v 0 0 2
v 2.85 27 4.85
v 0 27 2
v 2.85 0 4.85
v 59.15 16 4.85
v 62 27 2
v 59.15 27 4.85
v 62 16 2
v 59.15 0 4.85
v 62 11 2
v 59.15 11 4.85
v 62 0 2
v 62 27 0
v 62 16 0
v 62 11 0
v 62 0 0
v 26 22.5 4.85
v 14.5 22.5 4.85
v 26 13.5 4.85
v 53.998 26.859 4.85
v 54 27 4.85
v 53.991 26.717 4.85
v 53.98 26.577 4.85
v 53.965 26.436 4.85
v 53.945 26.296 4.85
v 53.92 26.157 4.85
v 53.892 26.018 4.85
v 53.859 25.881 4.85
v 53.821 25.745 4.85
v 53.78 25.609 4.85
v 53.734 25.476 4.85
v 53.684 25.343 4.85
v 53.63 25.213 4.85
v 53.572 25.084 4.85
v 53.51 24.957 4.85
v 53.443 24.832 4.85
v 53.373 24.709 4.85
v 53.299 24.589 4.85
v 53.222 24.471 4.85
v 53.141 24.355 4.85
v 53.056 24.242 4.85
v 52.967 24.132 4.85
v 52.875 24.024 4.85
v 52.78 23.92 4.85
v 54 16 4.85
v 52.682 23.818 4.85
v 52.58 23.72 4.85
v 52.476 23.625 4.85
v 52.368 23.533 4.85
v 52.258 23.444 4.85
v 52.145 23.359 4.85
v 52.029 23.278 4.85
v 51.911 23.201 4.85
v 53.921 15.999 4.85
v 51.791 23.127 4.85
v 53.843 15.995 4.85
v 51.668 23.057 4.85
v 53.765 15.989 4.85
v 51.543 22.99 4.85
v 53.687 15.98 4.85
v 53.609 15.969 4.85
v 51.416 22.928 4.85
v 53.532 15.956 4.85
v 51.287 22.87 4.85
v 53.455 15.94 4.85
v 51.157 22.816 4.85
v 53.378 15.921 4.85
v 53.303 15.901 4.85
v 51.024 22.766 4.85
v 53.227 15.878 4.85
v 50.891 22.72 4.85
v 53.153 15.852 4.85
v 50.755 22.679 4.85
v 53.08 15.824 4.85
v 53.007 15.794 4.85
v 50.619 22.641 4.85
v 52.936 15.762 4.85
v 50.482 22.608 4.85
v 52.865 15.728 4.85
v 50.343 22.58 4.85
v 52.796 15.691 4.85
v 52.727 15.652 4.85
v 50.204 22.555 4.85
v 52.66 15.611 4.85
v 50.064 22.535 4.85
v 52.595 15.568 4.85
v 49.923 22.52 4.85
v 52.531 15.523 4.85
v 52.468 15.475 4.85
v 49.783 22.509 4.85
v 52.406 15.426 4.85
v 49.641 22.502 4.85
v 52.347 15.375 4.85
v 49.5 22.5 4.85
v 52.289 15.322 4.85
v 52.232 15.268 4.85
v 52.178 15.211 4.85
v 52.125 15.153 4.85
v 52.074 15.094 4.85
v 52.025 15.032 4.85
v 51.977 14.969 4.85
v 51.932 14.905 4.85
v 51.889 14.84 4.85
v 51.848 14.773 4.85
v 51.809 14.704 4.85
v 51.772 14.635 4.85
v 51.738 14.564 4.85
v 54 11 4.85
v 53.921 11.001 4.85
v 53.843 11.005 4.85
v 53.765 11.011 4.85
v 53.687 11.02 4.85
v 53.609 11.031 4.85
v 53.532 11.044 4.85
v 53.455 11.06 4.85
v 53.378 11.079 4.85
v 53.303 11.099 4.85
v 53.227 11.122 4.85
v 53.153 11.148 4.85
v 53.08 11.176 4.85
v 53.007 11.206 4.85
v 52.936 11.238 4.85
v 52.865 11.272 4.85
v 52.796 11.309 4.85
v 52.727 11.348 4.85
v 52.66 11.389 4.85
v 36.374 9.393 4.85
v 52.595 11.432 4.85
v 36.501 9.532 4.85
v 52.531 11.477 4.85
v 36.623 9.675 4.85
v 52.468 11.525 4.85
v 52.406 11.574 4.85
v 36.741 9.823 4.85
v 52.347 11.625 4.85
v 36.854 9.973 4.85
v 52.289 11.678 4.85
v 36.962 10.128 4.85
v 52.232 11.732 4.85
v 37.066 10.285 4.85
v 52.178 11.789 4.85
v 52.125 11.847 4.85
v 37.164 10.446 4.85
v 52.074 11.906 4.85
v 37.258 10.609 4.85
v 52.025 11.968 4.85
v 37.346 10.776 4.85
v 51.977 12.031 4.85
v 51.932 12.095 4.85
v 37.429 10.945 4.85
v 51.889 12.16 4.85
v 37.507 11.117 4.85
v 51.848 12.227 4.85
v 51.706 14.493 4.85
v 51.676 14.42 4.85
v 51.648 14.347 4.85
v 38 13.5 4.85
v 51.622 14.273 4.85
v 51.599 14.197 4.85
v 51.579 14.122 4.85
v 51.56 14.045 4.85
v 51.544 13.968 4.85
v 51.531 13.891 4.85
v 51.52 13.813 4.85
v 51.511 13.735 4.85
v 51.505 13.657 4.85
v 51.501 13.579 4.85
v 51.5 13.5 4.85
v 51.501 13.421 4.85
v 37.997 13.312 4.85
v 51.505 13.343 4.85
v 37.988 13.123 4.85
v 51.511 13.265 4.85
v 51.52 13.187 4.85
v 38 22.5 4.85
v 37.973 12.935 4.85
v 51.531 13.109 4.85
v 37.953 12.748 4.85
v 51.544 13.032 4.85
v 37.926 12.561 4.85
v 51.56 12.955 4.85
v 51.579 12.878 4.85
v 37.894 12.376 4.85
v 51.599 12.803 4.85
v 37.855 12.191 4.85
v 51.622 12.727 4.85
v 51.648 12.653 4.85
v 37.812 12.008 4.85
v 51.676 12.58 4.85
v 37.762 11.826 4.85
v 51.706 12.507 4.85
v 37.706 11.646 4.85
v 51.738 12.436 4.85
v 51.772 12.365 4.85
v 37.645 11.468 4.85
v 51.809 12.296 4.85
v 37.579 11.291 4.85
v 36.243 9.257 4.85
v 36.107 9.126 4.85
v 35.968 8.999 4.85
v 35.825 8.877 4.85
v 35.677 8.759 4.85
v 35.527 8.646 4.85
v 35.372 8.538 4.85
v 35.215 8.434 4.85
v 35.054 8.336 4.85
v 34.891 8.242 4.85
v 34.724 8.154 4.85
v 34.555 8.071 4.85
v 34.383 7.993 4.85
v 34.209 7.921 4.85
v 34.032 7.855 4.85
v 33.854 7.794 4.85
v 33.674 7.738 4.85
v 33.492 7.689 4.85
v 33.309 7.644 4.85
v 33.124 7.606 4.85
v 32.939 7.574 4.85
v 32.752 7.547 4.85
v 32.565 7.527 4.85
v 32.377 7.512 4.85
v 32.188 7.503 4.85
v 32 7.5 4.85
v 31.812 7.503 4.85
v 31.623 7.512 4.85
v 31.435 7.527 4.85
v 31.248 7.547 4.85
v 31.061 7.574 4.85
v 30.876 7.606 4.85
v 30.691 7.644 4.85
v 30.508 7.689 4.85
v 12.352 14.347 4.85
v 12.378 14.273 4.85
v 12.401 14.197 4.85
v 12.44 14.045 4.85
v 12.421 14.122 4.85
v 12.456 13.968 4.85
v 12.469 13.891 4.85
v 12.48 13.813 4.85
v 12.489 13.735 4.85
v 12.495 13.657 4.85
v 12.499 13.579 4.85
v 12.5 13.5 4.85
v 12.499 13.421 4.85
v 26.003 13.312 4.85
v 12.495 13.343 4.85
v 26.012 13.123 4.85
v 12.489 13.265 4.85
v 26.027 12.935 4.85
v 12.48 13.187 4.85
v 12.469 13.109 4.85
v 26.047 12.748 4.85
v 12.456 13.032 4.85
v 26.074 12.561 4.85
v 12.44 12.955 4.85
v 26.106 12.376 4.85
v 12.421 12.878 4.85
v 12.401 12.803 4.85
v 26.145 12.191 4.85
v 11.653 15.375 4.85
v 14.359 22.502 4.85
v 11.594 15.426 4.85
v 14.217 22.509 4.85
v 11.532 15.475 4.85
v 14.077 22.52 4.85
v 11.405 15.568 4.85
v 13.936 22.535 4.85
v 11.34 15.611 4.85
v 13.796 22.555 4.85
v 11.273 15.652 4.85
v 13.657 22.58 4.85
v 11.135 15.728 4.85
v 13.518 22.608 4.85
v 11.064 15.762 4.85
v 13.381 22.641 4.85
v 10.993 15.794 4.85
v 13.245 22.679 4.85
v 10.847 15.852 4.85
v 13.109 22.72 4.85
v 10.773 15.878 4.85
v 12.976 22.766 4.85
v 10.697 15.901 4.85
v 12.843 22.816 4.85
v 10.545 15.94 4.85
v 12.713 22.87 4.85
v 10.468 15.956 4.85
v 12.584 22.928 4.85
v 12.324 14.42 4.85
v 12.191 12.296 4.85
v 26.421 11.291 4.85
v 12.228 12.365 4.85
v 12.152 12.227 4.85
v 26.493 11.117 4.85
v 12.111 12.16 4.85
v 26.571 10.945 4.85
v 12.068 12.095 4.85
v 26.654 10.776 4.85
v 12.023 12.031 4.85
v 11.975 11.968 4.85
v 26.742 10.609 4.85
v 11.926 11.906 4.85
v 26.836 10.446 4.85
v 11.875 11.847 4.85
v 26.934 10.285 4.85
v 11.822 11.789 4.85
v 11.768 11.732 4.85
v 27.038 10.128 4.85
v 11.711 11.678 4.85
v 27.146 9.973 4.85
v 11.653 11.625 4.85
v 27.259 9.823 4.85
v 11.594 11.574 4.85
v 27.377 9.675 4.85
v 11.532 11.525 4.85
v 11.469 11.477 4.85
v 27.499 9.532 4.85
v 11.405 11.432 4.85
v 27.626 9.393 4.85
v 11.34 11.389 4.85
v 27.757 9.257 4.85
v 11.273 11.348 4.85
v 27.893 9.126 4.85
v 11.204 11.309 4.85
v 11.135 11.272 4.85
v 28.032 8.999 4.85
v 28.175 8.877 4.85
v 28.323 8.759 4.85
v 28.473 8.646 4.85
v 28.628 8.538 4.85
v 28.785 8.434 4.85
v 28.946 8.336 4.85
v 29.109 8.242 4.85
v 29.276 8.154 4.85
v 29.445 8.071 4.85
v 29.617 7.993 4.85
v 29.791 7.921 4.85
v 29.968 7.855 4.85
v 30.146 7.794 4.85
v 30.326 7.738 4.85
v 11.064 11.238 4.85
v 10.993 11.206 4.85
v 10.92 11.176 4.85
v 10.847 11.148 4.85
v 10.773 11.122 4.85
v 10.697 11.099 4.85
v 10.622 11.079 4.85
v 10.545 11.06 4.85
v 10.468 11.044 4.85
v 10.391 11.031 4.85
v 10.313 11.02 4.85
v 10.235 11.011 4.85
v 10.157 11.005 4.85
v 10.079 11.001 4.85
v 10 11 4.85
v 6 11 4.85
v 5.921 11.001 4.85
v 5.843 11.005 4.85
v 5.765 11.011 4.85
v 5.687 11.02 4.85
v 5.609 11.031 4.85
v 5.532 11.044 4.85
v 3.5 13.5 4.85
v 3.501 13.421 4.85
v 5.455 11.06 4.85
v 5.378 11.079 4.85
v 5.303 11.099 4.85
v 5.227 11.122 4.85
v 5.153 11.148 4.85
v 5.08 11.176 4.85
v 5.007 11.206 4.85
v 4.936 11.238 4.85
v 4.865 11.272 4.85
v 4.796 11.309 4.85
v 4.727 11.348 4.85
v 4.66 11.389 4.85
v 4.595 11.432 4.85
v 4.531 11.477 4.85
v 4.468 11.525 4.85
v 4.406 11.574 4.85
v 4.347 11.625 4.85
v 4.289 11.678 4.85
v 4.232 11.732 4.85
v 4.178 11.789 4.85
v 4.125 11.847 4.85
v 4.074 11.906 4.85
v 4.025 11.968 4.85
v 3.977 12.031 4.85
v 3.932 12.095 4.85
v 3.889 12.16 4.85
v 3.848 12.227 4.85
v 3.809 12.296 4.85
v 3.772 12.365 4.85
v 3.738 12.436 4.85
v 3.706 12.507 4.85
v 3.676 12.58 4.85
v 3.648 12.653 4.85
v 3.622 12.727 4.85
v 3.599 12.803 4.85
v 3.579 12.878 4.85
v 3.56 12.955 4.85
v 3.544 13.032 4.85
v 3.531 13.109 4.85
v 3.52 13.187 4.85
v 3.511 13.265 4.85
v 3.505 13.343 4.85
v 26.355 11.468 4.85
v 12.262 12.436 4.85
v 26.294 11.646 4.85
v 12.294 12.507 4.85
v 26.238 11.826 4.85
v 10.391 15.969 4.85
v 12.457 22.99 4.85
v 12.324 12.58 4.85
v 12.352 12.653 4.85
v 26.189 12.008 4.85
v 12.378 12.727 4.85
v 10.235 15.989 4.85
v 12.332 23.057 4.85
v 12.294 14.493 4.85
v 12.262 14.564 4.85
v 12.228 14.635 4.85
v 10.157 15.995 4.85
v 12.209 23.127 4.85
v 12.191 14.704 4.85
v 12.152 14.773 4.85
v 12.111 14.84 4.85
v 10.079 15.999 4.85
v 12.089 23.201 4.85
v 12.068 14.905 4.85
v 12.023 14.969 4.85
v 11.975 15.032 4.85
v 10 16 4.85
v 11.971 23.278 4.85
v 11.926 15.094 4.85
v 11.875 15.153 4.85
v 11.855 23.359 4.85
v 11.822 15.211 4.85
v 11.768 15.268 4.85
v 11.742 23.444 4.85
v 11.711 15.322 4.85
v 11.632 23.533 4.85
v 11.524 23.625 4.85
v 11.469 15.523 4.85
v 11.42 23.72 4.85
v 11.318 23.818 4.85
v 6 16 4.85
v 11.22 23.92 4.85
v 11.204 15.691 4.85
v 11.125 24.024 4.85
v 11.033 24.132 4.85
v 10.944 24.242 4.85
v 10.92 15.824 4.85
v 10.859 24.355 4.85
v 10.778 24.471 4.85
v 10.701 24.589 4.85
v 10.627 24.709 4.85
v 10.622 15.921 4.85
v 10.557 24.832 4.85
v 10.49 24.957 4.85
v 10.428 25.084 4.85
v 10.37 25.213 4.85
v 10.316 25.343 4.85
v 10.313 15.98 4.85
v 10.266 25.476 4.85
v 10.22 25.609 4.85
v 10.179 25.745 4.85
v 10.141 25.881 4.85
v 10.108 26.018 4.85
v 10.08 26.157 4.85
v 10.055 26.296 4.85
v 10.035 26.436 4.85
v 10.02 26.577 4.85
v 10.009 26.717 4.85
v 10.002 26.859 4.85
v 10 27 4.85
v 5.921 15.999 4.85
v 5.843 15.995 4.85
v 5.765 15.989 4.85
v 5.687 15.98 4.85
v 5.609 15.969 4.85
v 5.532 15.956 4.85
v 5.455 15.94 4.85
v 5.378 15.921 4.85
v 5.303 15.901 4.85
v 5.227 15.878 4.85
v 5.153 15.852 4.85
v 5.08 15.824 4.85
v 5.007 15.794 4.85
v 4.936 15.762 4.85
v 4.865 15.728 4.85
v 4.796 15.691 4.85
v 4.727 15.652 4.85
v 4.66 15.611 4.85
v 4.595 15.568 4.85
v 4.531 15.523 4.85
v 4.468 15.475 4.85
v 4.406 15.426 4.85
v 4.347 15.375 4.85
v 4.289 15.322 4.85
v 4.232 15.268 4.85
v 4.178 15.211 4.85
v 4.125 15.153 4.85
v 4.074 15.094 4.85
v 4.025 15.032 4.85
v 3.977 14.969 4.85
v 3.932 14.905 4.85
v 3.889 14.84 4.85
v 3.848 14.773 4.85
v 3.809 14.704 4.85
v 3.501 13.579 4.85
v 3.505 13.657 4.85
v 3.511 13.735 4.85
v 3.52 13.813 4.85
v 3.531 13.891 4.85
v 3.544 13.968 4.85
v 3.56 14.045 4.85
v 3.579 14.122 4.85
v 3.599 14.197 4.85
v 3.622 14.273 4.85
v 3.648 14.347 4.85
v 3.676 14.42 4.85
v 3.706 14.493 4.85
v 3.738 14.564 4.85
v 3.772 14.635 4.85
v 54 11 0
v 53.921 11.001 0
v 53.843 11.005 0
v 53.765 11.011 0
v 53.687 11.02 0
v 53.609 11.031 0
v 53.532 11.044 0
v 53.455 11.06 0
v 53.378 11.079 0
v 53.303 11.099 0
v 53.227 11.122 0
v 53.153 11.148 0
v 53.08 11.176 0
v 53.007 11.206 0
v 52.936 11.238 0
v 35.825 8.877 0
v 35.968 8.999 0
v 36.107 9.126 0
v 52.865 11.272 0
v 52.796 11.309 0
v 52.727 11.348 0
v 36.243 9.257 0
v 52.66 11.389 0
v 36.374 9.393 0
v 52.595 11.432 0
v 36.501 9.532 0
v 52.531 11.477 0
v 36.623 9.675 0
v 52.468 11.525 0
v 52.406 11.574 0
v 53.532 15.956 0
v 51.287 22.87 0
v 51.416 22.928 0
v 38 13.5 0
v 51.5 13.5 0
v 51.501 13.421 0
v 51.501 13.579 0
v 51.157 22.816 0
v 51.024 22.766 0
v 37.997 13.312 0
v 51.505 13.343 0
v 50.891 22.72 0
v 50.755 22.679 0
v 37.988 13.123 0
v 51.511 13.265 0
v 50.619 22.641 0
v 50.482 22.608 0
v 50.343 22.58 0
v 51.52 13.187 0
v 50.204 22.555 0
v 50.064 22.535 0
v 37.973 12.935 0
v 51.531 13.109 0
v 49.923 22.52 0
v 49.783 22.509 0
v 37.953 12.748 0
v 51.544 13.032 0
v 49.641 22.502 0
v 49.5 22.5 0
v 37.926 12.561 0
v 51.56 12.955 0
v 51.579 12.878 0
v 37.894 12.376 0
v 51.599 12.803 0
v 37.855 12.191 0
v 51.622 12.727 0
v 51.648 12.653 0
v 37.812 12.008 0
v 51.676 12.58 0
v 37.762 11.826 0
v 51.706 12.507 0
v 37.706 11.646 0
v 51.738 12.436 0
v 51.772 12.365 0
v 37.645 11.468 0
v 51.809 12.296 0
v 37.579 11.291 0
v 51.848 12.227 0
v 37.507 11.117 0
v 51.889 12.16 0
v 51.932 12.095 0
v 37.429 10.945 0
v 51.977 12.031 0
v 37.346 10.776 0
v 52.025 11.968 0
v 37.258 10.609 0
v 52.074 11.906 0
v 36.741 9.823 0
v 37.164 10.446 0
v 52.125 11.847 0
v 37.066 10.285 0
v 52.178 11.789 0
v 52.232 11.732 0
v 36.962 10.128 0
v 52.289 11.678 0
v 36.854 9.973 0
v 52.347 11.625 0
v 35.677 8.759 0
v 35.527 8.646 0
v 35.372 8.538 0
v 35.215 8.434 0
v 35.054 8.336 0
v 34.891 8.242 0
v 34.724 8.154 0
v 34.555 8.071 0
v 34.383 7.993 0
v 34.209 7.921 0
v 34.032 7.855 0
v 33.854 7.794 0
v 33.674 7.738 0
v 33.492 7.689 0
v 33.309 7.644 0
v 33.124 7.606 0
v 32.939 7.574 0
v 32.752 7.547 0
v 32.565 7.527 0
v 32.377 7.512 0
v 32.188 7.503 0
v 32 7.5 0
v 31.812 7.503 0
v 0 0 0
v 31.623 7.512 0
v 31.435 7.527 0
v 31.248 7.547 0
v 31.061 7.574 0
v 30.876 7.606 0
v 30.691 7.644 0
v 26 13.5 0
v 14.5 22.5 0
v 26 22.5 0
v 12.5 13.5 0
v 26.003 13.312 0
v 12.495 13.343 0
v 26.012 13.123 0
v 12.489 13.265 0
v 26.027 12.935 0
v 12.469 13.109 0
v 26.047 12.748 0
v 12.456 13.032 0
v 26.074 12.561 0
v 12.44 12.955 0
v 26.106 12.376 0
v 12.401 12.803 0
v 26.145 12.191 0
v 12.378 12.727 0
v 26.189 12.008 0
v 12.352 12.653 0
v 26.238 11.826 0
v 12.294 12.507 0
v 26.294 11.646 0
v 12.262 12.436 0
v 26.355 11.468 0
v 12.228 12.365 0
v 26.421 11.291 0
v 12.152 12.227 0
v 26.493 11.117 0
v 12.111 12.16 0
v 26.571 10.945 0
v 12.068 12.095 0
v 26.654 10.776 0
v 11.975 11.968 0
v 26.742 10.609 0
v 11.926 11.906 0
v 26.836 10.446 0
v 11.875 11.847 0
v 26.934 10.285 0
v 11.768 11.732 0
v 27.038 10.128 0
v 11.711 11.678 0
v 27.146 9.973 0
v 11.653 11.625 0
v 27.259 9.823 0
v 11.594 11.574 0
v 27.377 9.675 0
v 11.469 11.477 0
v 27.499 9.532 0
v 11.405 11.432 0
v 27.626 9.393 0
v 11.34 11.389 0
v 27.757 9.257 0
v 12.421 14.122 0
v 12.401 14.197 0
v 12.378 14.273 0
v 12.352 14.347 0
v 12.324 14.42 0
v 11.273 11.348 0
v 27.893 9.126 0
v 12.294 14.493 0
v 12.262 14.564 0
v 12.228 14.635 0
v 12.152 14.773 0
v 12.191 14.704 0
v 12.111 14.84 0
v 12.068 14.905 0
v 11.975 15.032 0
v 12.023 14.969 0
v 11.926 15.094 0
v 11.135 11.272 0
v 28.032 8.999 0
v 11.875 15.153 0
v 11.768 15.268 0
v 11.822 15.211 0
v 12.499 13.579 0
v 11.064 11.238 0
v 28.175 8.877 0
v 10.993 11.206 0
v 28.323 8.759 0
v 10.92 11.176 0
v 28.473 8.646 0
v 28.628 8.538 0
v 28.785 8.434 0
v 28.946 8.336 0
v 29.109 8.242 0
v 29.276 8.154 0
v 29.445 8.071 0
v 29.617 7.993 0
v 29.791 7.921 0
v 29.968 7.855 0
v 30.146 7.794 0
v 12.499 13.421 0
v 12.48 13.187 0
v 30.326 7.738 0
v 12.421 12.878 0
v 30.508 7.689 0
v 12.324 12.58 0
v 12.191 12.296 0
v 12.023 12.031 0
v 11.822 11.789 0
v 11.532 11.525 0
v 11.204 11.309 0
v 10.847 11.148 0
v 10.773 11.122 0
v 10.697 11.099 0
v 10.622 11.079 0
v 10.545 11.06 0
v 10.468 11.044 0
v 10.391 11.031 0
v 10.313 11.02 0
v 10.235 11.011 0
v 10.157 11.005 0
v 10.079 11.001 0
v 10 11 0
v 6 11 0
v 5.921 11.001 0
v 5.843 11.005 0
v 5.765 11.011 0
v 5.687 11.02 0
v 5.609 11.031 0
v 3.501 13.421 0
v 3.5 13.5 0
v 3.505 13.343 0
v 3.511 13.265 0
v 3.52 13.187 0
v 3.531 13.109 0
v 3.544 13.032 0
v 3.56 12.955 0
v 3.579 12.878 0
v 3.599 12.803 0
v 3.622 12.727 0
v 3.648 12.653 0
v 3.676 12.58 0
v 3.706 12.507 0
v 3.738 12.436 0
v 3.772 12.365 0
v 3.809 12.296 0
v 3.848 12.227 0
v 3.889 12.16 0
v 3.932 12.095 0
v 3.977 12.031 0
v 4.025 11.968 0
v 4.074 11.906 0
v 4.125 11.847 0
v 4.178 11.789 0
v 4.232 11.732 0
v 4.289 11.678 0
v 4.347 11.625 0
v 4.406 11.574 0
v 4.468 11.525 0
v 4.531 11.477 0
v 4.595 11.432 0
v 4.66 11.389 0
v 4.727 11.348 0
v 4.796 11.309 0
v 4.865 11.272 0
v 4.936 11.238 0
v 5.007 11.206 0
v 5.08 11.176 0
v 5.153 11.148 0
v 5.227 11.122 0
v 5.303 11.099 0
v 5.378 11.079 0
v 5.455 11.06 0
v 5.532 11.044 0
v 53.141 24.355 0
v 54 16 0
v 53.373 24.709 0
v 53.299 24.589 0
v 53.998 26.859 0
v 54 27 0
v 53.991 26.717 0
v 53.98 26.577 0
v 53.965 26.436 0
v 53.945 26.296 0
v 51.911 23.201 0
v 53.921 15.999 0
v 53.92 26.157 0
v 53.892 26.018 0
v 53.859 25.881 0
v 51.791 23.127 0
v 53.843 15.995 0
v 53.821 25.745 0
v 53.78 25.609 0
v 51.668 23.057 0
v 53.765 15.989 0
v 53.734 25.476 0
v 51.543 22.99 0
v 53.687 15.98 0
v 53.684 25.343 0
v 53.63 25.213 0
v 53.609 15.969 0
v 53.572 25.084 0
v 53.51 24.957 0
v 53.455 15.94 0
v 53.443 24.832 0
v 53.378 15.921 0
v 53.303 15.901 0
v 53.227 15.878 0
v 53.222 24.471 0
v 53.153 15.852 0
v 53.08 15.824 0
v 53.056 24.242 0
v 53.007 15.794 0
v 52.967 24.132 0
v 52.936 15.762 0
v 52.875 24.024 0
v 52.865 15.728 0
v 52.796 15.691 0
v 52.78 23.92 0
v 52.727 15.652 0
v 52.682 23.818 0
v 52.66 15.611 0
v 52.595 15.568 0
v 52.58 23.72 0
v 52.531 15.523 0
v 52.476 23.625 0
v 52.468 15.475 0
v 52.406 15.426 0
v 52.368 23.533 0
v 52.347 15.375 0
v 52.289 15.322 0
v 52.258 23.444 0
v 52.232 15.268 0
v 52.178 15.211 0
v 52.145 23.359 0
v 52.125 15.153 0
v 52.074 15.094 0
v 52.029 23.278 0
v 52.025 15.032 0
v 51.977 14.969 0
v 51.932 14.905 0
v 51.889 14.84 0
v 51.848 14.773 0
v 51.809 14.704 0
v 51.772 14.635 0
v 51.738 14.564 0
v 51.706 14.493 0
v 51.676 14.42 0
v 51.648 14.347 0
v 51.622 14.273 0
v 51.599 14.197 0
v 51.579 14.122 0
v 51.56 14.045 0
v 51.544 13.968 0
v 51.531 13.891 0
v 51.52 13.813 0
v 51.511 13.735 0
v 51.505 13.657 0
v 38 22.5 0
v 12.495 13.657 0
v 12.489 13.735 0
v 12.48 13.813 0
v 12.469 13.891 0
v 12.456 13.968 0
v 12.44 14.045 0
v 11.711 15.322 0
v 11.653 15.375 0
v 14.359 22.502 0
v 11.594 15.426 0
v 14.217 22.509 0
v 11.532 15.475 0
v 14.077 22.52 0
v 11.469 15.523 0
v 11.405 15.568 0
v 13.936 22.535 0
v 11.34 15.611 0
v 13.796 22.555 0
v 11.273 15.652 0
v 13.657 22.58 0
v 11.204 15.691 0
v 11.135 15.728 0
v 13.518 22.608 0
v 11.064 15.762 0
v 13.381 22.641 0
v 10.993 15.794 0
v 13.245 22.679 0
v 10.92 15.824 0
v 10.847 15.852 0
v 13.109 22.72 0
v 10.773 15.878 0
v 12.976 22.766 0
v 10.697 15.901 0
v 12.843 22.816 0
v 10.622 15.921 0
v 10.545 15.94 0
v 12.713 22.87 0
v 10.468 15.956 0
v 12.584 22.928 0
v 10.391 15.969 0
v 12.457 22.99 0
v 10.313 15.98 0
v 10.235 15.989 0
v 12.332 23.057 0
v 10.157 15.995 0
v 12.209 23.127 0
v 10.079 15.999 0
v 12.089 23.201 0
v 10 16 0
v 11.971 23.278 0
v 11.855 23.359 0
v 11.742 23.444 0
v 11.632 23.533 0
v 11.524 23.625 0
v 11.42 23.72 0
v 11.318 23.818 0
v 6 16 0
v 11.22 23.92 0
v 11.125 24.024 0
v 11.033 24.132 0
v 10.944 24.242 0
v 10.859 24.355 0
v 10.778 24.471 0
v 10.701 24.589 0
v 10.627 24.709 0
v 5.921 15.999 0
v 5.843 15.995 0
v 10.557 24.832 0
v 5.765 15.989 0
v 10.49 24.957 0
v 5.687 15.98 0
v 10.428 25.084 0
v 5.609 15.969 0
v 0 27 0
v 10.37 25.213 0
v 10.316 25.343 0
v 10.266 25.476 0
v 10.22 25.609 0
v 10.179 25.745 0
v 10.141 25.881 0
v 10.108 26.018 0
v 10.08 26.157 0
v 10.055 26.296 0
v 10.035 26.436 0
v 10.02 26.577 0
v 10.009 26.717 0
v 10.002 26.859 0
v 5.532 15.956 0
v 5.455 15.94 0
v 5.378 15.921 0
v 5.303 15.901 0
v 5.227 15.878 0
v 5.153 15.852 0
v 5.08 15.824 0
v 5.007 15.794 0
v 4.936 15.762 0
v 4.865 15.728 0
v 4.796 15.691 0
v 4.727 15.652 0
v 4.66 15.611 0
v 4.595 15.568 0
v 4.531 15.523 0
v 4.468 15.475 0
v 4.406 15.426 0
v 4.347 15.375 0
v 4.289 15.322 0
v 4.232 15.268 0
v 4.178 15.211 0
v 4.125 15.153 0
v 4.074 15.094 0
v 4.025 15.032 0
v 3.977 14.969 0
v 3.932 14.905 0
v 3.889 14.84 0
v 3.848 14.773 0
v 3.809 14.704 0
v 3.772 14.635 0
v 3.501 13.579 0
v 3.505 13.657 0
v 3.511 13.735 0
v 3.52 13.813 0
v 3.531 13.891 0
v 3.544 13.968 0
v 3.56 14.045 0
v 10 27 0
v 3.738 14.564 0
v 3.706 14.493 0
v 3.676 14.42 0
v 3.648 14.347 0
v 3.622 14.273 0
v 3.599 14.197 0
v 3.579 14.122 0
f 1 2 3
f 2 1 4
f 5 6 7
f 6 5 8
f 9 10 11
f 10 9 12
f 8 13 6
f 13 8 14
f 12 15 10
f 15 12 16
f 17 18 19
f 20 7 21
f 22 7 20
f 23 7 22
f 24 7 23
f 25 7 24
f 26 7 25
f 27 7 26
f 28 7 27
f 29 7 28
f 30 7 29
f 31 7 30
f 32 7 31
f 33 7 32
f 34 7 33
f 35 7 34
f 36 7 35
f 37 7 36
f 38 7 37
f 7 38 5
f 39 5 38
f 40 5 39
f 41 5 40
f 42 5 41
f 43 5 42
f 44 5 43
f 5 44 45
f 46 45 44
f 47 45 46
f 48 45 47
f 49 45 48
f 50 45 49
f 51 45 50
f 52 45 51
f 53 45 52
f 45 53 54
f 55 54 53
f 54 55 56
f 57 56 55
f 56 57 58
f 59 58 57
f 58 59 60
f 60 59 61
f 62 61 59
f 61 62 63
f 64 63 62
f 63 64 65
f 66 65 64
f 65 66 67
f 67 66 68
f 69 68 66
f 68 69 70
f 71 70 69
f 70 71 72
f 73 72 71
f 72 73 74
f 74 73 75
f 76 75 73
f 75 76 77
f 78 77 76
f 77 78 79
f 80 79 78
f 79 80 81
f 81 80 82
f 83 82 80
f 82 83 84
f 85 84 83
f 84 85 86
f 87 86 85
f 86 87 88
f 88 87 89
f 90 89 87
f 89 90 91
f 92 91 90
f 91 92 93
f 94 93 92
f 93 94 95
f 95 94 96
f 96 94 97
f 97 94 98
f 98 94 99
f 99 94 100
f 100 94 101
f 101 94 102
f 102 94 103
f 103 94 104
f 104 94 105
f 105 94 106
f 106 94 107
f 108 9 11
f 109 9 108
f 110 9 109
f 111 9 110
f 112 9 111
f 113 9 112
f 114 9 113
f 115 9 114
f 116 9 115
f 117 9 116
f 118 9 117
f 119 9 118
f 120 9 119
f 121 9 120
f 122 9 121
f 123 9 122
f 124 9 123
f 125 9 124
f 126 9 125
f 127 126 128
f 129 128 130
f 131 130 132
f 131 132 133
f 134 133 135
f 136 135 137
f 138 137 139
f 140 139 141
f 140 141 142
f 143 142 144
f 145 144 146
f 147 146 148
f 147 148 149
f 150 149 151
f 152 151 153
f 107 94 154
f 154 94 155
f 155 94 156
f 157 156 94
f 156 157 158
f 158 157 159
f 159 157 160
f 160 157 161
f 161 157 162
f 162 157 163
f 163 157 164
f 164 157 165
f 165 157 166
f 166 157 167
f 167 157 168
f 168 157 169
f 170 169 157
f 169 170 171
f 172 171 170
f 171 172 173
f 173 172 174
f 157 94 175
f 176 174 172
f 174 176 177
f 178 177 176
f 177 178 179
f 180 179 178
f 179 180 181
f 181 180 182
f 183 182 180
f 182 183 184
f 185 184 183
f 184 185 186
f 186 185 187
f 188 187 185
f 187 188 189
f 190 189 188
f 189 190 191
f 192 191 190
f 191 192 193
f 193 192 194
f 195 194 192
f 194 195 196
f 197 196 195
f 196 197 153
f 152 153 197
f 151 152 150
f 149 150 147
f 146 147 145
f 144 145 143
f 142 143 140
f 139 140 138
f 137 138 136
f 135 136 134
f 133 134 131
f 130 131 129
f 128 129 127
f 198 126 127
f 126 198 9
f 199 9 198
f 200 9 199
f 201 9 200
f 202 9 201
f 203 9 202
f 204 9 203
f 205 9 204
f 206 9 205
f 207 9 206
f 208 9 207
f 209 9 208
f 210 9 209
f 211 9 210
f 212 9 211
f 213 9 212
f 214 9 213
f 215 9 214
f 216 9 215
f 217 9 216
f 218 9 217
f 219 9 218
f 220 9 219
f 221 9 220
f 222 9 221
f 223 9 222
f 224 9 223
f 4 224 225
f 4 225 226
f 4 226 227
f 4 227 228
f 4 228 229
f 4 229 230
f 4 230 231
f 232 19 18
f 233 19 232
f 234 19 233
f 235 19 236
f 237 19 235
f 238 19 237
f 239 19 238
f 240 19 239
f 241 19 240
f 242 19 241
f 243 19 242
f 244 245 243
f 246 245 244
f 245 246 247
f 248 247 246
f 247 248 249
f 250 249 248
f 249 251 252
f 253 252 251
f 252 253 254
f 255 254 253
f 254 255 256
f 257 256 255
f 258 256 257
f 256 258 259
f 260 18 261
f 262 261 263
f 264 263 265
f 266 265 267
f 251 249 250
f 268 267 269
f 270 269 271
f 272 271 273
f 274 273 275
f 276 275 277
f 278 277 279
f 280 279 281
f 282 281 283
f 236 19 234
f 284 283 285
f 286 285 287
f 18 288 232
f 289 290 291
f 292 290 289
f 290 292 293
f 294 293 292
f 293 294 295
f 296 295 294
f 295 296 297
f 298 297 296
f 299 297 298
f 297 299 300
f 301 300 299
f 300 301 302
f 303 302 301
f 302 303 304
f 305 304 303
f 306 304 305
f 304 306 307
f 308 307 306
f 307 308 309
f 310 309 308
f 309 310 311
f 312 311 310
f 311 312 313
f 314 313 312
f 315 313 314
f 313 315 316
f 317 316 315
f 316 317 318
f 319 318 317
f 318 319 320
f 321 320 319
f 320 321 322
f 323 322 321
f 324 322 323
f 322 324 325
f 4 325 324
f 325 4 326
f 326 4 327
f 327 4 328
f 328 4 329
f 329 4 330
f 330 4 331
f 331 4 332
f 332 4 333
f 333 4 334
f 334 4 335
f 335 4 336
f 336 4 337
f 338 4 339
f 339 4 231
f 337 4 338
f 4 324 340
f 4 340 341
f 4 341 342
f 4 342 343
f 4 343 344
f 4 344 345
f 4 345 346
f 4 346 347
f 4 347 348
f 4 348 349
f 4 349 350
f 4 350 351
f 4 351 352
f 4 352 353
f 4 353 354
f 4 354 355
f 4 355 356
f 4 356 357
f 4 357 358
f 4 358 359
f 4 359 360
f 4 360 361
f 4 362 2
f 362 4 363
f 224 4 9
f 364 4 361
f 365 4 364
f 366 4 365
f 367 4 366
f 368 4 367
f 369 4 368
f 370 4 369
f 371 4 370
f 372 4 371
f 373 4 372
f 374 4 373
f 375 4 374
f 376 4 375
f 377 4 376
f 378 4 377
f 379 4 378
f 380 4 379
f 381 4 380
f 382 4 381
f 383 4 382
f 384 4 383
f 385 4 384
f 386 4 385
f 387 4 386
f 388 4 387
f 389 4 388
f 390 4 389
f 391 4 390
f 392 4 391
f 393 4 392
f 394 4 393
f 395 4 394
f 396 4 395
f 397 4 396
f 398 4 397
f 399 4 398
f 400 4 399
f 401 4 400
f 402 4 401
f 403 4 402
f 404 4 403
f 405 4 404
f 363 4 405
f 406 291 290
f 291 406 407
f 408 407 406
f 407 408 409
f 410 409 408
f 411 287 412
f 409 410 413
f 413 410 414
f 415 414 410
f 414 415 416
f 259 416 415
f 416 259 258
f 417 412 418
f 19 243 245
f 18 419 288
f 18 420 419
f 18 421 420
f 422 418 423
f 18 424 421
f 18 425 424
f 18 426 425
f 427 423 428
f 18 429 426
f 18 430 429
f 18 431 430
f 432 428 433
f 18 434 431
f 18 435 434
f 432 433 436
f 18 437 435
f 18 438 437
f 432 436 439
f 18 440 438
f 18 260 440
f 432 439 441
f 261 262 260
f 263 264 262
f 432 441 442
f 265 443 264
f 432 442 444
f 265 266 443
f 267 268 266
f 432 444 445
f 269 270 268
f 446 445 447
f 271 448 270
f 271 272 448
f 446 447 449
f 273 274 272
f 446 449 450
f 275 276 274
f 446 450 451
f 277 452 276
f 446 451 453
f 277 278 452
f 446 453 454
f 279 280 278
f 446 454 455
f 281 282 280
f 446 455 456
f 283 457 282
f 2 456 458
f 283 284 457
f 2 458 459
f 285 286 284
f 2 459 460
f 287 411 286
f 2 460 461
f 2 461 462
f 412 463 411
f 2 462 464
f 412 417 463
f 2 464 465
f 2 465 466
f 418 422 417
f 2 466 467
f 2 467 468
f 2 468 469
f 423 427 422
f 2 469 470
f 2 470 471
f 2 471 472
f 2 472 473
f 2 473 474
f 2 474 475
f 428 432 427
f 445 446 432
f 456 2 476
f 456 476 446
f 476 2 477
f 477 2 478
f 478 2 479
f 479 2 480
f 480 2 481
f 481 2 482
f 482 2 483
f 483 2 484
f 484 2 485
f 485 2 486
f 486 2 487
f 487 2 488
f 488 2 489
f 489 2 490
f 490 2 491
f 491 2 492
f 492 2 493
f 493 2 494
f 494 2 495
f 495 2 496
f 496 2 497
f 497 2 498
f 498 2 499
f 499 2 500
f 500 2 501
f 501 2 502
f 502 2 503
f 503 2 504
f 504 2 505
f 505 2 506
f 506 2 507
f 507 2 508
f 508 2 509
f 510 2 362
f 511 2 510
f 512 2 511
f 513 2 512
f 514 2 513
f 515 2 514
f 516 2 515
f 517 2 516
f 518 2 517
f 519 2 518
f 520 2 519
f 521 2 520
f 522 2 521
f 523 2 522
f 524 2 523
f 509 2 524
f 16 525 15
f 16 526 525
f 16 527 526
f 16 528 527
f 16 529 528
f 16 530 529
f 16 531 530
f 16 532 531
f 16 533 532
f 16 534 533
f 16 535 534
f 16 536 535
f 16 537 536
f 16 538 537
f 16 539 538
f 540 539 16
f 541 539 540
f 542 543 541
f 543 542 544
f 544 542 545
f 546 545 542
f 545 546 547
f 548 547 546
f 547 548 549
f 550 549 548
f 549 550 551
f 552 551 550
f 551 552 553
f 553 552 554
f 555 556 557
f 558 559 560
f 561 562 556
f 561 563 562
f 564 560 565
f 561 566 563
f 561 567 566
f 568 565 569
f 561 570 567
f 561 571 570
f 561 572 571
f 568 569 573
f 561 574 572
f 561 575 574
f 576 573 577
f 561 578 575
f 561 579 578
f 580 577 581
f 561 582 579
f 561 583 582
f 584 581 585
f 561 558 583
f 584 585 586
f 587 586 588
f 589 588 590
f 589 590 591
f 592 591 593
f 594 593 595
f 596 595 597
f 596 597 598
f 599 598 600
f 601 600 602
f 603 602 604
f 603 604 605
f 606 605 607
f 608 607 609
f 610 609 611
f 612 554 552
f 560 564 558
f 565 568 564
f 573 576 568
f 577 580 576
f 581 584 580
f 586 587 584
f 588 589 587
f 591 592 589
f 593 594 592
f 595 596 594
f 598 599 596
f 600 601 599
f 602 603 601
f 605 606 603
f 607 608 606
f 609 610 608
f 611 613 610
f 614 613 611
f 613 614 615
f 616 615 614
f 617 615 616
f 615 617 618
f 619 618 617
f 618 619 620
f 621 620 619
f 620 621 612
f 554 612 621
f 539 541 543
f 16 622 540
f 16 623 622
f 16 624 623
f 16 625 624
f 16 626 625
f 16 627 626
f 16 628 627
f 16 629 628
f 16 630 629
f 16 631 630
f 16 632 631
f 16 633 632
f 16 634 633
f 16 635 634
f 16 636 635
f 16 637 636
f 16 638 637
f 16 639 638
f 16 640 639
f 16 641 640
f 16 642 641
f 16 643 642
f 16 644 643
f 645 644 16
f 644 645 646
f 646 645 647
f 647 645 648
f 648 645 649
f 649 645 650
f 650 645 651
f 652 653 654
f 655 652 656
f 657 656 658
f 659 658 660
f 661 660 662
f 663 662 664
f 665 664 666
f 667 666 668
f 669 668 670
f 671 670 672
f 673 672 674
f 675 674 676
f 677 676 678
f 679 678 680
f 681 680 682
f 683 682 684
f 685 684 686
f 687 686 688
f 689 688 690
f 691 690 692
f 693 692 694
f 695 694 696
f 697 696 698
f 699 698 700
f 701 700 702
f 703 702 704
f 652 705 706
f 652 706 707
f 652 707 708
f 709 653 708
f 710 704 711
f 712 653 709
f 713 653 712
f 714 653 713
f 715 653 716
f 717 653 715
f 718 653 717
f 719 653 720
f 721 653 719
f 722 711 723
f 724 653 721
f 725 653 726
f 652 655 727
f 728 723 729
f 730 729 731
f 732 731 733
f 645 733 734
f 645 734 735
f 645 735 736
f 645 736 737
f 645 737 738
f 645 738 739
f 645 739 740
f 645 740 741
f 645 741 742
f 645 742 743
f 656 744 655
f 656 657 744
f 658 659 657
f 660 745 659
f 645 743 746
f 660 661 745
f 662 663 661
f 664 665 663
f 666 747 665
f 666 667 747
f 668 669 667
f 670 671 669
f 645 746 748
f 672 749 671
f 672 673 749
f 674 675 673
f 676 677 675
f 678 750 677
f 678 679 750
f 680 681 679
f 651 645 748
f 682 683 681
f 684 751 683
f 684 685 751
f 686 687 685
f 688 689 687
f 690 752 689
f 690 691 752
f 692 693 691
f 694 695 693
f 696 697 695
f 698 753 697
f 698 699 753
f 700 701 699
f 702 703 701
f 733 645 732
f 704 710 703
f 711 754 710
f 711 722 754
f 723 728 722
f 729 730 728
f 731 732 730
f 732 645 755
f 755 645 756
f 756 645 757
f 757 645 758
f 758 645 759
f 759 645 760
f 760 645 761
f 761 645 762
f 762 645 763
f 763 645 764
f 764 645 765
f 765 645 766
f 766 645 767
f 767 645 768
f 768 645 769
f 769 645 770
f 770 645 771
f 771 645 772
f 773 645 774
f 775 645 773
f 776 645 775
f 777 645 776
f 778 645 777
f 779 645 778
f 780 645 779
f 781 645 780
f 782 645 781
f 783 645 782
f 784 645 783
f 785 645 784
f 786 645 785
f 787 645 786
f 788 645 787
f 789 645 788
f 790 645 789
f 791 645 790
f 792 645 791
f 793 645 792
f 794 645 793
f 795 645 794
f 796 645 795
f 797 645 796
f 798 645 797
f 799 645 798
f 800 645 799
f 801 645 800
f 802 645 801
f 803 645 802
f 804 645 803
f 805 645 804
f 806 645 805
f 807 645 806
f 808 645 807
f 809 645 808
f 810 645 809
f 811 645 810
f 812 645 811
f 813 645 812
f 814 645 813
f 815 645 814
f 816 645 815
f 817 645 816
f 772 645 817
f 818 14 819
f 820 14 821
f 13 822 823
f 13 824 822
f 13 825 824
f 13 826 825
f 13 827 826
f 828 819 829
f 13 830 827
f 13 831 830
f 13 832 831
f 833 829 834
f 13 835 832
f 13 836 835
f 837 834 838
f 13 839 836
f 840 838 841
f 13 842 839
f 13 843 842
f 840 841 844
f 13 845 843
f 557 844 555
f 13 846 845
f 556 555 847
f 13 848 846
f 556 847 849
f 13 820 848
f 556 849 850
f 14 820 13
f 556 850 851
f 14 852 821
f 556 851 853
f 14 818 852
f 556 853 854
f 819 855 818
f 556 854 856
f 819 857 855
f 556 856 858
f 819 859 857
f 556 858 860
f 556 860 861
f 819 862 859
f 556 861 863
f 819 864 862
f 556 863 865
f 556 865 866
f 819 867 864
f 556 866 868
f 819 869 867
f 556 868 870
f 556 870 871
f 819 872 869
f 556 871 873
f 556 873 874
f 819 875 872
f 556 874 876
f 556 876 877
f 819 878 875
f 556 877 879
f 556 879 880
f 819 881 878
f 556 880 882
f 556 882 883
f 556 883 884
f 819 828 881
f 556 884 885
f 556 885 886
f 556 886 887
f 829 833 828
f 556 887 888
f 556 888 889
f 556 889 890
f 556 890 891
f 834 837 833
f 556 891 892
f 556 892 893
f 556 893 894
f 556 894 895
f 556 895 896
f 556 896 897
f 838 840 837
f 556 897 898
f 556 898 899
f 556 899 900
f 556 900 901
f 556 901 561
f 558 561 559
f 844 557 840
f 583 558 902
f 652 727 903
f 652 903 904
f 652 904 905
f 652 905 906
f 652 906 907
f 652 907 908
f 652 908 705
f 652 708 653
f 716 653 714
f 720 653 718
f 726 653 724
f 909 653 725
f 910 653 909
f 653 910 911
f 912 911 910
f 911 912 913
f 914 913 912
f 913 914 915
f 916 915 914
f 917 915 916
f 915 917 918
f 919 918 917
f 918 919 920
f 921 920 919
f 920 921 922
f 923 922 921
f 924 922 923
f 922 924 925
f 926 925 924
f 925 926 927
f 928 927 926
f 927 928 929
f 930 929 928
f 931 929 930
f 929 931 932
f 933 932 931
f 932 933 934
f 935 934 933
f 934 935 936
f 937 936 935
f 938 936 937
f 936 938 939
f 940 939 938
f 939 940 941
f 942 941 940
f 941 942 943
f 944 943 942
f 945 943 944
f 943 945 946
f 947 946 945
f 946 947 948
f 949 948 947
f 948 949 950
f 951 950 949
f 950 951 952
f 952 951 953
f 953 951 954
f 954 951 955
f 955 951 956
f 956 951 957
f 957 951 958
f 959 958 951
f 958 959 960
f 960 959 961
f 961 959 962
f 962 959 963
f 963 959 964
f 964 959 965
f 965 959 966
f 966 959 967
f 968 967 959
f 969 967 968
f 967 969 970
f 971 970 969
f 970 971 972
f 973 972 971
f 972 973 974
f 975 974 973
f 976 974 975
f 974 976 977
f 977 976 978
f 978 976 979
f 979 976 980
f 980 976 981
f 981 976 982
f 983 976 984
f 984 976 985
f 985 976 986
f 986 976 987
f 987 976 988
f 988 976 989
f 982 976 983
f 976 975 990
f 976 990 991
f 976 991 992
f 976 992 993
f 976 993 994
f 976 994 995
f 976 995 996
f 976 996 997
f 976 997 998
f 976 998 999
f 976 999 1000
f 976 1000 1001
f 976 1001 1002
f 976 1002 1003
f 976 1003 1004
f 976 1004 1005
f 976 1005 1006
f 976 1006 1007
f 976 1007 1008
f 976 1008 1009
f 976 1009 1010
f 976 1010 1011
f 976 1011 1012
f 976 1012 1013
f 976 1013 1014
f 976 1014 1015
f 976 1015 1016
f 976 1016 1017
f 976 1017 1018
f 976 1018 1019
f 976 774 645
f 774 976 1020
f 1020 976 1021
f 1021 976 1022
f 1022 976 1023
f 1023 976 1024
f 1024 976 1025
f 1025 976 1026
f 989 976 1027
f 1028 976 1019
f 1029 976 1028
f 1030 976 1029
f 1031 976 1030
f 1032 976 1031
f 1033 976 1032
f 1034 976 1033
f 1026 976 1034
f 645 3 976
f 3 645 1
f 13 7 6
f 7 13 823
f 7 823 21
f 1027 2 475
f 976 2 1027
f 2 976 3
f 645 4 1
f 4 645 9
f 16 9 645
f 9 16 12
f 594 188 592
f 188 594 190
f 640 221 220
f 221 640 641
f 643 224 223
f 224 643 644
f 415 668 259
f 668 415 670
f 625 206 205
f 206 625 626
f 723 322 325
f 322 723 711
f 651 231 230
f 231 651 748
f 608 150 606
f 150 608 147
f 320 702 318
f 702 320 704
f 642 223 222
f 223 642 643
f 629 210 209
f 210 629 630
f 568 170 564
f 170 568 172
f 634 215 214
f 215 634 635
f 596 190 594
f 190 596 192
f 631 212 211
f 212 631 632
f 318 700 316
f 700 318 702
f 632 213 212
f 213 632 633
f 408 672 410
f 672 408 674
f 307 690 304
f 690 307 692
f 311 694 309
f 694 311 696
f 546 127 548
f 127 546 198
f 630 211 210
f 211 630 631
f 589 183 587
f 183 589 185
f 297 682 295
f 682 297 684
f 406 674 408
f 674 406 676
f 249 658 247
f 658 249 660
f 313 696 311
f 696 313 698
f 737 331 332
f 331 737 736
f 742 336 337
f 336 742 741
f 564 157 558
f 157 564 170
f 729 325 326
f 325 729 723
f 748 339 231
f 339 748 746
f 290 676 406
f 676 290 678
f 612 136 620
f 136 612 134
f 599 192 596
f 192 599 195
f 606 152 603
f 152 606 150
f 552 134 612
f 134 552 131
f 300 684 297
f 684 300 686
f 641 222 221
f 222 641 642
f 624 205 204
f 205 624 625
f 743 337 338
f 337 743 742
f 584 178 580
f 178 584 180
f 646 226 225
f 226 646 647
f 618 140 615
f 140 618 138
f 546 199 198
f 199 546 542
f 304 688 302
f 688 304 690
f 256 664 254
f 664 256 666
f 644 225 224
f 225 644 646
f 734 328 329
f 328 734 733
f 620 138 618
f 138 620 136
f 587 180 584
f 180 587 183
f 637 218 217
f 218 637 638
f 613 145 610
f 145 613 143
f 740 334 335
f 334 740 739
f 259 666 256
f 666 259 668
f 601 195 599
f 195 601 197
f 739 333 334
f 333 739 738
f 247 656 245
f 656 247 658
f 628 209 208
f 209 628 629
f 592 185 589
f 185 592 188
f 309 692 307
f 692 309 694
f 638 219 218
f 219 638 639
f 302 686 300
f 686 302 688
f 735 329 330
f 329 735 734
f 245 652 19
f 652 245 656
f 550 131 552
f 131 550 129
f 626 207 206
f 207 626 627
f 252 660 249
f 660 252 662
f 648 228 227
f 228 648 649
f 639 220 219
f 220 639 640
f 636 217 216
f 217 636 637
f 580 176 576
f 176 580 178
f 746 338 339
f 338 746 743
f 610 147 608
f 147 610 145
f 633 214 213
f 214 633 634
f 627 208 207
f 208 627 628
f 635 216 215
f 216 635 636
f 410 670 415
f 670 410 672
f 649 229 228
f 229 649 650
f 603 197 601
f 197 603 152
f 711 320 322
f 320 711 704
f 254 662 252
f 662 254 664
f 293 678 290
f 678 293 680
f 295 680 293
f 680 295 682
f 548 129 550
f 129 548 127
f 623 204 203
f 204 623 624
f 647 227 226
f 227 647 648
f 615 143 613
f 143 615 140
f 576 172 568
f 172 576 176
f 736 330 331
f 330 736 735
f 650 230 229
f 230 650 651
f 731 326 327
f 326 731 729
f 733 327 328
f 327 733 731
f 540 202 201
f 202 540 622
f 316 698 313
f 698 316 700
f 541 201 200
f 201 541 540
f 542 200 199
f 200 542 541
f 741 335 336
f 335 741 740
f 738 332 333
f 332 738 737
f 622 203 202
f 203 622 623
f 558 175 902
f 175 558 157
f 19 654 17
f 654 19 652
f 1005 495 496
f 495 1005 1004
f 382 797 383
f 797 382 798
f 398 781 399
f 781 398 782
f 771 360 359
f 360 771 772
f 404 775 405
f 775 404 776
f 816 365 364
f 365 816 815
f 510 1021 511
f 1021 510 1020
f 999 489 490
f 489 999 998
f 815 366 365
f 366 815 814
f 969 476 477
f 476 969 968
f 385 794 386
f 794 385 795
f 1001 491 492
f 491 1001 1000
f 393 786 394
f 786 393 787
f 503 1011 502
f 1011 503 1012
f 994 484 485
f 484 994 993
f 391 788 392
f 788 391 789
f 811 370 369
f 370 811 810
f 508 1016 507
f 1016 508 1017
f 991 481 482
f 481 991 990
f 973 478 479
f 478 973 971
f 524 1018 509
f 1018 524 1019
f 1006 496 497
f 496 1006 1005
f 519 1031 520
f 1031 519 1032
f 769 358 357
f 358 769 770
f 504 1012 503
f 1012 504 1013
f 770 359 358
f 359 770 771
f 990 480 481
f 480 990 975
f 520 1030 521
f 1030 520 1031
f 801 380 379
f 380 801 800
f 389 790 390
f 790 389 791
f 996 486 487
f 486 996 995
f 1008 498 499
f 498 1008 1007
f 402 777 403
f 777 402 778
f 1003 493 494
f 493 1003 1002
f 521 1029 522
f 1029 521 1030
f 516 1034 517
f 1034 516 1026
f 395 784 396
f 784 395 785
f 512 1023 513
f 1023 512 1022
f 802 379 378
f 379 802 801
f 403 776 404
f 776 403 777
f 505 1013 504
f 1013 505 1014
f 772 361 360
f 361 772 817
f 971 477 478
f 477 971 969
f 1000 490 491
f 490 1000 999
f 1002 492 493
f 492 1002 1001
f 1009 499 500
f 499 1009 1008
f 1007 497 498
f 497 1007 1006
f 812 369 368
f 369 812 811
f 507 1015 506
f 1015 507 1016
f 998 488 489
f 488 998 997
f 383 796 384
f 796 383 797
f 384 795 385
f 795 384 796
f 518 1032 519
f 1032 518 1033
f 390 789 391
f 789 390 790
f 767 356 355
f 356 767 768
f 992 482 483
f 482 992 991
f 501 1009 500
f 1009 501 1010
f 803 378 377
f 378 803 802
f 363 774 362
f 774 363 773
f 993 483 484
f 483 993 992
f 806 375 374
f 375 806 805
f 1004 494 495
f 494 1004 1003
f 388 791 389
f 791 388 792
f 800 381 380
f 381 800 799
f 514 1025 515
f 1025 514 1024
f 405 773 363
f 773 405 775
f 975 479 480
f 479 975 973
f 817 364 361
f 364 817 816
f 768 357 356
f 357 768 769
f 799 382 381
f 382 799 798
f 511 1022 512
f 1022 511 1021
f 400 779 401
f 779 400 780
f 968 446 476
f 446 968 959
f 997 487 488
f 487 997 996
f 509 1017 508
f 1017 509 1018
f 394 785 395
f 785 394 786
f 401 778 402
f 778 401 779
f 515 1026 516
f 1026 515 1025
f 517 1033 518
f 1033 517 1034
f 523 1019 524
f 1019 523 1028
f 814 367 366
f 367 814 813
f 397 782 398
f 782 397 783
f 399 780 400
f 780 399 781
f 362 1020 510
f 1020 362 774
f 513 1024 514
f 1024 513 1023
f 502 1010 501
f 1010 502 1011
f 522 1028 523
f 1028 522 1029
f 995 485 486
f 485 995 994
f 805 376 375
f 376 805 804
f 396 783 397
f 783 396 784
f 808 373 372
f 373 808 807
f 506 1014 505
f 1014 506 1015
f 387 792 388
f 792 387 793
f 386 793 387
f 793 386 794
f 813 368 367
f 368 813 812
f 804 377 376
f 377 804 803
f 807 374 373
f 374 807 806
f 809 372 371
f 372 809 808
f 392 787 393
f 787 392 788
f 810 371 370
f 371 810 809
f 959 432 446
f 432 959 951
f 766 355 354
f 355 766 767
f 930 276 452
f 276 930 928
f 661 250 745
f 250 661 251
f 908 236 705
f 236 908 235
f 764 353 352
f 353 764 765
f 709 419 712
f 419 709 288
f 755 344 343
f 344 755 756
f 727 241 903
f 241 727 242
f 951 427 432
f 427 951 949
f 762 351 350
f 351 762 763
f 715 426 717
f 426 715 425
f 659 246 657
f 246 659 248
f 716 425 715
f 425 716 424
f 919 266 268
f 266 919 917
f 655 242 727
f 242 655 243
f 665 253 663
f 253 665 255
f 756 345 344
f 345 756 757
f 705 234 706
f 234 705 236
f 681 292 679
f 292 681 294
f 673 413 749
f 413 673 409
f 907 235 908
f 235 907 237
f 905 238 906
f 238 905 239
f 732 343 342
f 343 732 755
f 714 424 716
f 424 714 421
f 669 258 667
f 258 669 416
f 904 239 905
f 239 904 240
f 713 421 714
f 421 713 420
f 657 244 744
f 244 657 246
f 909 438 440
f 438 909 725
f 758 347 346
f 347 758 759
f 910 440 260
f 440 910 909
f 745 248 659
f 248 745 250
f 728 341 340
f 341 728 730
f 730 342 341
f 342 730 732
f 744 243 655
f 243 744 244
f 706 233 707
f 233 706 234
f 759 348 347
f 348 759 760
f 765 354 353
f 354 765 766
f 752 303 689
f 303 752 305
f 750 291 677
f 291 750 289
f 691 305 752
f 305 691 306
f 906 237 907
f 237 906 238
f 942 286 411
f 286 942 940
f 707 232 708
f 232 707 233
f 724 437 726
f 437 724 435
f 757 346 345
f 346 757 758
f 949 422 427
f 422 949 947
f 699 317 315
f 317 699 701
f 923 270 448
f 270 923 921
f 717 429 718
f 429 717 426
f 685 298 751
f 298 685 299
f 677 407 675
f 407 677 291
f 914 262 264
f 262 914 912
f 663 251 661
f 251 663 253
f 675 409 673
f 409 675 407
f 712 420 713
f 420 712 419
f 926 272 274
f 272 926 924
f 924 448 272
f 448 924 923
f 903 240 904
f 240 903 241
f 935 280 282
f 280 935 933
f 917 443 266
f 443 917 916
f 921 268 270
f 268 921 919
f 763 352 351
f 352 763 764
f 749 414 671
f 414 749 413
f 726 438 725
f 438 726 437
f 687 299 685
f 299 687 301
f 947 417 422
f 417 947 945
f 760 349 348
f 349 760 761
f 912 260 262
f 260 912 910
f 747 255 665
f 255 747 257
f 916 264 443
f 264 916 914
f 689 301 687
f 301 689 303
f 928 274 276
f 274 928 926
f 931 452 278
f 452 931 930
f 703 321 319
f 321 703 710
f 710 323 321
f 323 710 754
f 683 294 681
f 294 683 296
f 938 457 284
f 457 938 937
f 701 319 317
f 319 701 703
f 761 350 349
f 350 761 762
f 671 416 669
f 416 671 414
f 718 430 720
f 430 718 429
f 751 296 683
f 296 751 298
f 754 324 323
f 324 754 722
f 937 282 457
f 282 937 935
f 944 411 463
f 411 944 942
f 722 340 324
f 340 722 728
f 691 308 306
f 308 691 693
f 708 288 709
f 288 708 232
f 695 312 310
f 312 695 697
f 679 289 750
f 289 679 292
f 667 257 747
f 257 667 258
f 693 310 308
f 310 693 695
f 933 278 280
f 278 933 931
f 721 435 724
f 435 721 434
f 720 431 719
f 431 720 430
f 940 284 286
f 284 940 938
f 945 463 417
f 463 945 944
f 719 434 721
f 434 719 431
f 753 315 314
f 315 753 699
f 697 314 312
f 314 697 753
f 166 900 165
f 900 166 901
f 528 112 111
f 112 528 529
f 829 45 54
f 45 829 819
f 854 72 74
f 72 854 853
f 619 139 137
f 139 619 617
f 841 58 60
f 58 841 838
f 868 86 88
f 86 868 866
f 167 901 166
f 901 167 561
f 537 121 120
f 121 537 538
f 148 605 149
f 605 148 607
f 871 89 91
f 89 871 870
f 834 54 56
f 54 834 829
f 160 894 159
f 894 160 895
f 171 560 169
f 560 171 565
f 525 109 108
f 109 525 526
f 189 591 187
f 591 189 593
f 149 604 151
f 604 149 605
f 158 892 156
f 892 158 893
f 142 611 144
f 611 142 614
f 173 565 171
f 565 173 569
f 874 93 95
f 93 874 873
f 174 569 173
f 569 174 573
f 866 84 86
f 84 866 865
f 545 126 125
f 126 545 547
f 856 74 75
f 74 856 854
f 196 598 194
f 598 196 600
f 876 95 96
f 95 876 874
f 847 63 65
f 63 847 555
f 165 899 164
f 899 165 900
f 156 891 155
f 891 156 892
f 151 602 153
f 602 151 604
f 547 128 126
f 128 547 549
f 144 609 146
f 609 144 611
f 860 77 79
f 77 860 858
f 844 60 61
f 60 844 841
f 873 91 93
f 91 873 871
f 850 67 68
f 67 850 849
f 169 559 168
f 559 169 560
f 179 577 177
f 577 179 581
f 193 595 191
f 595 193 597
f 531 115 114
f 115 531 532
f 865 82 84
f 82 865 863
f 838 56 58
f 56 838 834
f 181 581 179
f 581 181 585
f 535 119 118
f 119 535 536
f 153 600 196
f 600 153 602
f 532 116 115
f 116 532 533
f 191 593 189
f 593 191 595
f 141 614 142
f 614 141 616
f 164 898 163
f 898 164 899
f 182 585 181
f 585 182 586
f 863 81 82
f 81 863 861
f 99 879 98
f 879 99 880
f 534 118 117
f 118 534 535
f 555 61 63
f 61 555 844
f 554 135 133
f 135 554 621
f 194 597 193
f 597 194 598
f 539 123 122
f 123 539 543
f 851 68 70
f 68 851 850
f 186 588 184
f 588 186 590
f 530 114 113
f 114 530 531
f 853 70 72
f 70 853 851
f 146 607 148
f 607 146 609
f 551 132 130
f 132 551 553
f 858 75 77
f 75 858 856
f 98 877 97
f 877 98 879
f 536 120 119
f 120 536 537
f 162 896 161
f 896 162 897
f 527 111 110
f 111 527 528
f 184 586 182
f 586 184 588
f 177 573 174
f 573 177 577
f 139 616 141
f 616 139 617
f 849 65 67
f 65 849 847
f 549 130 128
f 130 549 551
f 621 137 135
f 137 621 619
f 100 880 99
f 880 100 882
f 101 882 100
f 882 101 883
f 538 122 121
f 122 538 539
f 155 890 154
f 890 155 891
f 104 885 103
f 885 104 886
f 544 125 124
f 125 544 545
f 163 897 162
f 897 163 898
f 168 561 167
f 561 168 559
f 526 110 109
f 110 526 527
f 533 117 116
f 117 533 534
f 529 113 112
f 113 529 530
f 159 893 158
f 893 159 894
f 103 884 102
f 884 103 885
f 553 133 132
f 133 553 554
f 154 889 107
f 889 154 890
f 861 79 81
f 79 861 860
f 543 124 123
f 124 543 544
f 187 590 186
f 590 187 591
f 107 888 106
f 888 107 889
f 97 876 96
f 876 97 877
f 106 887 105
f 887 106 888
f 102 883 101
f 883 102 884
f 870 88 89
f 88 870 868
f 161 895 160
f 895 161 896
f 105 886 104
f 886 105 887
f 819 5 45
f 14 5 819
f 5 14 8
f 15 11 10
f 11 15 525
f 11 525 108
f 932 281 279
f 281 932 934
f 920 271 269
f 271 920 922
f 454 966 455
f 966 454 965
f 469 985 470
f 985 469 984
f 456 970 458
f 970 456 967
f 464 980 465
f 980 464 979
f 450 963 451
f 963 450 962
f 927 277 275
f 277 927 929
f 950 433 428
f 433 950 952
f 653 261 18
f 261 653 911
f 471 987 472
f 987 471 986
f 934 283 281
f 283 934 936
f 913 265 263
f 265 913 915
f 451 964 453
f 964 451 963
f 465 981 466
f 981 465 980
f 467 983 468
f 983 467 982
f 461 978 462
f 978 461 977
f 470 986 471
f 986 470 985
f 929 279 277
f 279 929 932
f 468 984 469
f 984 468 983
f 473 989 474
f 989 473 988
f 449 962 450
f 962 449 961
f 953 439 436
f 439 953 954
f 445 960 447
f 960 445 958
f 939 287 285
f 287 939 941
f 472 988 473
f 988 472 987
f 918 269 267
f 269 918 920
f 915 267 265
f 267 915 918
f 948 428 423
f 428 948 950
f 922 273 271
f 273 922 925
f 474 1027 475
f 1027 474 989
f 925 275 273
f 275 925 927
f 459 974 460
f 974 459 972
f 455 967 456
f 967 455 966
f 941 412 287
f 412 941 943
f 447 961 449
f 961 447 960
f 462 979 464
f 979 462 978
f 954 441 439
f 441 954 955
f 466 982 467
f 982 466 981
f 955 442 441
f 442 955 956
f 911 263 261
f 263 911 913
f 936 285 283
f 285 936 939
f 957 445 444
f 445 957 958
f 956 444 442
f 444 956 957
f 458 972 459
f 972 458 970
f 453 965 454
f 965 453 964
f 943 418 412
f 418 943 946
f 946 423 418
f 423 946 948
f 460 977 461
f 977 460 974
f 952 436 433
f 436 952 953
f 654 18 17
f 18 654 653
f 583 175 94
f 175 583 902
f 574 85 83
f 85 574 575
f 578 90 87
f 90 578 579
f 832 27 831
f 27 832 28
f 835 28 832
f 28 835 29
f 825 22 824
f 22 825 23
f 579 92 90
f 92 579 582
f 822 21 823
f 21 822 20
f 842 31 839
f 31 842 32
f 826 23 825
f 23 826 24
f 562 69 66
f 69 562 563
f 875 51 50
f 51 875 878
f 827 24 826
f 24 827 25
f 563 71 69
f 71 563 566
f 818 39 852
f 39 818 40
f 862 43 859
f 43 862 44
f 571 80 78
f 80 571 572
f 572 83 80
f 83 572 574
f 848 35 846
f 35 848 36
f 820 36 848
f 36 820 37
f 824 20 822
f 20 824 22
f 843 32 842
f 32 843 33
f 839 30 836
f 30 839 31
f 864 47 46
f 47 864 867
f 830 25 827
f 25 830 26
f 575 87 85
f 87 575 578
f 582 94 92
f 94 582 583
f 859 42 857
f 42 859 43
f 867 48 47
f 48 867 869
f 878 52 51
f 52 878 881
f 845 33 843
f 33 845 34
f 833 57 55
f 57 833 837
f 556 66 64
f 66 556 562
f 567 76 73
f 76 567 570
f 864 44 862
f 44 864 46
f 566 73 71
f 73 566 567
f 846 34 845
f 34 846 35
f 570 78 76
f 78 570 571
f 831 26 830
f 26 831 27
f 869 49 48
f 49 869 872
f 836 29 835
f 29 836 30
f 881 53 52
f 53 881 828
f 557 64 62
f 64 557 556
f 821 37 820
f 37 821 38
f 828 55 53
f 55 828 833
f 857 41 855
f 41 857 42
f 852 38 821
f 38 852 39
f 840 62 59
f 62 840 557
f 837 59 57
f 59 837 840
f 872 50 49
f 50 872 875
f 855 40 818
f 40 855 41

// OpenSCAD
$fn=200;

eps = 0.05;

bigSize = 100;


// plate
thickness = 4.85; //5.0;
length = 62;
width  = 27;
cutOffsetZ = 2;

// big slot
radiusBigSlot = 6.0;
holeOffsetBigSlot = 32;

// small closed slot
radiusSmallSlot = 2.5;
lengthSmallClosedSlot = 4.0;
holeOffsetSmallClosedSlot = 6;

// small open slot
lengthSmallOpenSlot = 10.0;
holeOffsetSmallOpenSlot = 54;

// side cut
radiusSideCut = 4.5;
fanSize = 40; 
lengthSideCut = fanSize - 2 * radiusSideCut + 4; 
holeOffsetSideCut = holeOffsetBigSlot-lengthSideCut/2;



module drawSideCut()
{
	translate([holeOffsetSideCut,width,-eps]) 
	{
		cylinder(h=thickness+2*eps, r=radiusSideCut);
		translate([0,-radiusSideCut,0]) cube([lengthSideCut,radiusSideCut*2,thickness+2*eps]);
		translate([lengthSideCut,0,0]) cylinder(h=thickness+2*eps, r=radiusSideCut);
	}
}


module drawSmallClosedSlot()
{
	translate([holeOffsetSmallClosedSlot,width/2,-eps]) 
	{
		cylinder(h=thickness+2*eps, r=radiusSmallSlot);
		translate([0,-radiusSmallSlot,0]) cube([lengthSmallClosedSlot,radiusSmallSlot*2,thickness+2*eps]);
		translate([lengthSmallClosedSlot,0,0]) cylinder(h=thickness+2*eps, r=radiusSmallSlot);
	}
}


module drawSmallOpenSlot()
{
	translate([holeOffsetSmallOpenSlot,width/2,-eps]) 
	{
		cylinder(h=thickness+2*eps, r=radiusSmallSlot);
		translate([0,-radiusSmallSlot,0]) cube([lengthSmallOpenSlot,radiusSmallSlot*2,thickness+2*eps]);
	}
}


module drawBigSlot()
{
	translate([holeOffsetBigSlot,width/2,-eps]) 
	{
		cylinder(h=thickness+2*eps, r=radiusBigSlot);
		translate([-radiusBigSlot,0,0]) cube([2*radiusBigSlot,width/2+eps,thickness+2*eps]);
	}
}


module drawBasePlate()
{
	difference()
	{
		union()
		{
			cube([length, width, thickness]);
		}
		union()
		{
			translate([0,-bigSize/2,cutOffsetZ]) rotate([0,-45,0]) cube([bigSize, bigSize, bigSize]);
			translate([length,-bigSize/2,cutOffsetZ]) rotate([0,-45,0]) cube([bigSize, bigSize, bigSize]);	
		}
	}
}


module drawMountingPlate()
{
	difference()
	{
		union()
		{
			drawBasePlate();
		}
		union()
		{
			drawBigSlot();
			drawSmallClosedSlot();
			drawSmallOpenSlot();
			drawSideCut();
		}
	}
}


drawMountingPlate();
